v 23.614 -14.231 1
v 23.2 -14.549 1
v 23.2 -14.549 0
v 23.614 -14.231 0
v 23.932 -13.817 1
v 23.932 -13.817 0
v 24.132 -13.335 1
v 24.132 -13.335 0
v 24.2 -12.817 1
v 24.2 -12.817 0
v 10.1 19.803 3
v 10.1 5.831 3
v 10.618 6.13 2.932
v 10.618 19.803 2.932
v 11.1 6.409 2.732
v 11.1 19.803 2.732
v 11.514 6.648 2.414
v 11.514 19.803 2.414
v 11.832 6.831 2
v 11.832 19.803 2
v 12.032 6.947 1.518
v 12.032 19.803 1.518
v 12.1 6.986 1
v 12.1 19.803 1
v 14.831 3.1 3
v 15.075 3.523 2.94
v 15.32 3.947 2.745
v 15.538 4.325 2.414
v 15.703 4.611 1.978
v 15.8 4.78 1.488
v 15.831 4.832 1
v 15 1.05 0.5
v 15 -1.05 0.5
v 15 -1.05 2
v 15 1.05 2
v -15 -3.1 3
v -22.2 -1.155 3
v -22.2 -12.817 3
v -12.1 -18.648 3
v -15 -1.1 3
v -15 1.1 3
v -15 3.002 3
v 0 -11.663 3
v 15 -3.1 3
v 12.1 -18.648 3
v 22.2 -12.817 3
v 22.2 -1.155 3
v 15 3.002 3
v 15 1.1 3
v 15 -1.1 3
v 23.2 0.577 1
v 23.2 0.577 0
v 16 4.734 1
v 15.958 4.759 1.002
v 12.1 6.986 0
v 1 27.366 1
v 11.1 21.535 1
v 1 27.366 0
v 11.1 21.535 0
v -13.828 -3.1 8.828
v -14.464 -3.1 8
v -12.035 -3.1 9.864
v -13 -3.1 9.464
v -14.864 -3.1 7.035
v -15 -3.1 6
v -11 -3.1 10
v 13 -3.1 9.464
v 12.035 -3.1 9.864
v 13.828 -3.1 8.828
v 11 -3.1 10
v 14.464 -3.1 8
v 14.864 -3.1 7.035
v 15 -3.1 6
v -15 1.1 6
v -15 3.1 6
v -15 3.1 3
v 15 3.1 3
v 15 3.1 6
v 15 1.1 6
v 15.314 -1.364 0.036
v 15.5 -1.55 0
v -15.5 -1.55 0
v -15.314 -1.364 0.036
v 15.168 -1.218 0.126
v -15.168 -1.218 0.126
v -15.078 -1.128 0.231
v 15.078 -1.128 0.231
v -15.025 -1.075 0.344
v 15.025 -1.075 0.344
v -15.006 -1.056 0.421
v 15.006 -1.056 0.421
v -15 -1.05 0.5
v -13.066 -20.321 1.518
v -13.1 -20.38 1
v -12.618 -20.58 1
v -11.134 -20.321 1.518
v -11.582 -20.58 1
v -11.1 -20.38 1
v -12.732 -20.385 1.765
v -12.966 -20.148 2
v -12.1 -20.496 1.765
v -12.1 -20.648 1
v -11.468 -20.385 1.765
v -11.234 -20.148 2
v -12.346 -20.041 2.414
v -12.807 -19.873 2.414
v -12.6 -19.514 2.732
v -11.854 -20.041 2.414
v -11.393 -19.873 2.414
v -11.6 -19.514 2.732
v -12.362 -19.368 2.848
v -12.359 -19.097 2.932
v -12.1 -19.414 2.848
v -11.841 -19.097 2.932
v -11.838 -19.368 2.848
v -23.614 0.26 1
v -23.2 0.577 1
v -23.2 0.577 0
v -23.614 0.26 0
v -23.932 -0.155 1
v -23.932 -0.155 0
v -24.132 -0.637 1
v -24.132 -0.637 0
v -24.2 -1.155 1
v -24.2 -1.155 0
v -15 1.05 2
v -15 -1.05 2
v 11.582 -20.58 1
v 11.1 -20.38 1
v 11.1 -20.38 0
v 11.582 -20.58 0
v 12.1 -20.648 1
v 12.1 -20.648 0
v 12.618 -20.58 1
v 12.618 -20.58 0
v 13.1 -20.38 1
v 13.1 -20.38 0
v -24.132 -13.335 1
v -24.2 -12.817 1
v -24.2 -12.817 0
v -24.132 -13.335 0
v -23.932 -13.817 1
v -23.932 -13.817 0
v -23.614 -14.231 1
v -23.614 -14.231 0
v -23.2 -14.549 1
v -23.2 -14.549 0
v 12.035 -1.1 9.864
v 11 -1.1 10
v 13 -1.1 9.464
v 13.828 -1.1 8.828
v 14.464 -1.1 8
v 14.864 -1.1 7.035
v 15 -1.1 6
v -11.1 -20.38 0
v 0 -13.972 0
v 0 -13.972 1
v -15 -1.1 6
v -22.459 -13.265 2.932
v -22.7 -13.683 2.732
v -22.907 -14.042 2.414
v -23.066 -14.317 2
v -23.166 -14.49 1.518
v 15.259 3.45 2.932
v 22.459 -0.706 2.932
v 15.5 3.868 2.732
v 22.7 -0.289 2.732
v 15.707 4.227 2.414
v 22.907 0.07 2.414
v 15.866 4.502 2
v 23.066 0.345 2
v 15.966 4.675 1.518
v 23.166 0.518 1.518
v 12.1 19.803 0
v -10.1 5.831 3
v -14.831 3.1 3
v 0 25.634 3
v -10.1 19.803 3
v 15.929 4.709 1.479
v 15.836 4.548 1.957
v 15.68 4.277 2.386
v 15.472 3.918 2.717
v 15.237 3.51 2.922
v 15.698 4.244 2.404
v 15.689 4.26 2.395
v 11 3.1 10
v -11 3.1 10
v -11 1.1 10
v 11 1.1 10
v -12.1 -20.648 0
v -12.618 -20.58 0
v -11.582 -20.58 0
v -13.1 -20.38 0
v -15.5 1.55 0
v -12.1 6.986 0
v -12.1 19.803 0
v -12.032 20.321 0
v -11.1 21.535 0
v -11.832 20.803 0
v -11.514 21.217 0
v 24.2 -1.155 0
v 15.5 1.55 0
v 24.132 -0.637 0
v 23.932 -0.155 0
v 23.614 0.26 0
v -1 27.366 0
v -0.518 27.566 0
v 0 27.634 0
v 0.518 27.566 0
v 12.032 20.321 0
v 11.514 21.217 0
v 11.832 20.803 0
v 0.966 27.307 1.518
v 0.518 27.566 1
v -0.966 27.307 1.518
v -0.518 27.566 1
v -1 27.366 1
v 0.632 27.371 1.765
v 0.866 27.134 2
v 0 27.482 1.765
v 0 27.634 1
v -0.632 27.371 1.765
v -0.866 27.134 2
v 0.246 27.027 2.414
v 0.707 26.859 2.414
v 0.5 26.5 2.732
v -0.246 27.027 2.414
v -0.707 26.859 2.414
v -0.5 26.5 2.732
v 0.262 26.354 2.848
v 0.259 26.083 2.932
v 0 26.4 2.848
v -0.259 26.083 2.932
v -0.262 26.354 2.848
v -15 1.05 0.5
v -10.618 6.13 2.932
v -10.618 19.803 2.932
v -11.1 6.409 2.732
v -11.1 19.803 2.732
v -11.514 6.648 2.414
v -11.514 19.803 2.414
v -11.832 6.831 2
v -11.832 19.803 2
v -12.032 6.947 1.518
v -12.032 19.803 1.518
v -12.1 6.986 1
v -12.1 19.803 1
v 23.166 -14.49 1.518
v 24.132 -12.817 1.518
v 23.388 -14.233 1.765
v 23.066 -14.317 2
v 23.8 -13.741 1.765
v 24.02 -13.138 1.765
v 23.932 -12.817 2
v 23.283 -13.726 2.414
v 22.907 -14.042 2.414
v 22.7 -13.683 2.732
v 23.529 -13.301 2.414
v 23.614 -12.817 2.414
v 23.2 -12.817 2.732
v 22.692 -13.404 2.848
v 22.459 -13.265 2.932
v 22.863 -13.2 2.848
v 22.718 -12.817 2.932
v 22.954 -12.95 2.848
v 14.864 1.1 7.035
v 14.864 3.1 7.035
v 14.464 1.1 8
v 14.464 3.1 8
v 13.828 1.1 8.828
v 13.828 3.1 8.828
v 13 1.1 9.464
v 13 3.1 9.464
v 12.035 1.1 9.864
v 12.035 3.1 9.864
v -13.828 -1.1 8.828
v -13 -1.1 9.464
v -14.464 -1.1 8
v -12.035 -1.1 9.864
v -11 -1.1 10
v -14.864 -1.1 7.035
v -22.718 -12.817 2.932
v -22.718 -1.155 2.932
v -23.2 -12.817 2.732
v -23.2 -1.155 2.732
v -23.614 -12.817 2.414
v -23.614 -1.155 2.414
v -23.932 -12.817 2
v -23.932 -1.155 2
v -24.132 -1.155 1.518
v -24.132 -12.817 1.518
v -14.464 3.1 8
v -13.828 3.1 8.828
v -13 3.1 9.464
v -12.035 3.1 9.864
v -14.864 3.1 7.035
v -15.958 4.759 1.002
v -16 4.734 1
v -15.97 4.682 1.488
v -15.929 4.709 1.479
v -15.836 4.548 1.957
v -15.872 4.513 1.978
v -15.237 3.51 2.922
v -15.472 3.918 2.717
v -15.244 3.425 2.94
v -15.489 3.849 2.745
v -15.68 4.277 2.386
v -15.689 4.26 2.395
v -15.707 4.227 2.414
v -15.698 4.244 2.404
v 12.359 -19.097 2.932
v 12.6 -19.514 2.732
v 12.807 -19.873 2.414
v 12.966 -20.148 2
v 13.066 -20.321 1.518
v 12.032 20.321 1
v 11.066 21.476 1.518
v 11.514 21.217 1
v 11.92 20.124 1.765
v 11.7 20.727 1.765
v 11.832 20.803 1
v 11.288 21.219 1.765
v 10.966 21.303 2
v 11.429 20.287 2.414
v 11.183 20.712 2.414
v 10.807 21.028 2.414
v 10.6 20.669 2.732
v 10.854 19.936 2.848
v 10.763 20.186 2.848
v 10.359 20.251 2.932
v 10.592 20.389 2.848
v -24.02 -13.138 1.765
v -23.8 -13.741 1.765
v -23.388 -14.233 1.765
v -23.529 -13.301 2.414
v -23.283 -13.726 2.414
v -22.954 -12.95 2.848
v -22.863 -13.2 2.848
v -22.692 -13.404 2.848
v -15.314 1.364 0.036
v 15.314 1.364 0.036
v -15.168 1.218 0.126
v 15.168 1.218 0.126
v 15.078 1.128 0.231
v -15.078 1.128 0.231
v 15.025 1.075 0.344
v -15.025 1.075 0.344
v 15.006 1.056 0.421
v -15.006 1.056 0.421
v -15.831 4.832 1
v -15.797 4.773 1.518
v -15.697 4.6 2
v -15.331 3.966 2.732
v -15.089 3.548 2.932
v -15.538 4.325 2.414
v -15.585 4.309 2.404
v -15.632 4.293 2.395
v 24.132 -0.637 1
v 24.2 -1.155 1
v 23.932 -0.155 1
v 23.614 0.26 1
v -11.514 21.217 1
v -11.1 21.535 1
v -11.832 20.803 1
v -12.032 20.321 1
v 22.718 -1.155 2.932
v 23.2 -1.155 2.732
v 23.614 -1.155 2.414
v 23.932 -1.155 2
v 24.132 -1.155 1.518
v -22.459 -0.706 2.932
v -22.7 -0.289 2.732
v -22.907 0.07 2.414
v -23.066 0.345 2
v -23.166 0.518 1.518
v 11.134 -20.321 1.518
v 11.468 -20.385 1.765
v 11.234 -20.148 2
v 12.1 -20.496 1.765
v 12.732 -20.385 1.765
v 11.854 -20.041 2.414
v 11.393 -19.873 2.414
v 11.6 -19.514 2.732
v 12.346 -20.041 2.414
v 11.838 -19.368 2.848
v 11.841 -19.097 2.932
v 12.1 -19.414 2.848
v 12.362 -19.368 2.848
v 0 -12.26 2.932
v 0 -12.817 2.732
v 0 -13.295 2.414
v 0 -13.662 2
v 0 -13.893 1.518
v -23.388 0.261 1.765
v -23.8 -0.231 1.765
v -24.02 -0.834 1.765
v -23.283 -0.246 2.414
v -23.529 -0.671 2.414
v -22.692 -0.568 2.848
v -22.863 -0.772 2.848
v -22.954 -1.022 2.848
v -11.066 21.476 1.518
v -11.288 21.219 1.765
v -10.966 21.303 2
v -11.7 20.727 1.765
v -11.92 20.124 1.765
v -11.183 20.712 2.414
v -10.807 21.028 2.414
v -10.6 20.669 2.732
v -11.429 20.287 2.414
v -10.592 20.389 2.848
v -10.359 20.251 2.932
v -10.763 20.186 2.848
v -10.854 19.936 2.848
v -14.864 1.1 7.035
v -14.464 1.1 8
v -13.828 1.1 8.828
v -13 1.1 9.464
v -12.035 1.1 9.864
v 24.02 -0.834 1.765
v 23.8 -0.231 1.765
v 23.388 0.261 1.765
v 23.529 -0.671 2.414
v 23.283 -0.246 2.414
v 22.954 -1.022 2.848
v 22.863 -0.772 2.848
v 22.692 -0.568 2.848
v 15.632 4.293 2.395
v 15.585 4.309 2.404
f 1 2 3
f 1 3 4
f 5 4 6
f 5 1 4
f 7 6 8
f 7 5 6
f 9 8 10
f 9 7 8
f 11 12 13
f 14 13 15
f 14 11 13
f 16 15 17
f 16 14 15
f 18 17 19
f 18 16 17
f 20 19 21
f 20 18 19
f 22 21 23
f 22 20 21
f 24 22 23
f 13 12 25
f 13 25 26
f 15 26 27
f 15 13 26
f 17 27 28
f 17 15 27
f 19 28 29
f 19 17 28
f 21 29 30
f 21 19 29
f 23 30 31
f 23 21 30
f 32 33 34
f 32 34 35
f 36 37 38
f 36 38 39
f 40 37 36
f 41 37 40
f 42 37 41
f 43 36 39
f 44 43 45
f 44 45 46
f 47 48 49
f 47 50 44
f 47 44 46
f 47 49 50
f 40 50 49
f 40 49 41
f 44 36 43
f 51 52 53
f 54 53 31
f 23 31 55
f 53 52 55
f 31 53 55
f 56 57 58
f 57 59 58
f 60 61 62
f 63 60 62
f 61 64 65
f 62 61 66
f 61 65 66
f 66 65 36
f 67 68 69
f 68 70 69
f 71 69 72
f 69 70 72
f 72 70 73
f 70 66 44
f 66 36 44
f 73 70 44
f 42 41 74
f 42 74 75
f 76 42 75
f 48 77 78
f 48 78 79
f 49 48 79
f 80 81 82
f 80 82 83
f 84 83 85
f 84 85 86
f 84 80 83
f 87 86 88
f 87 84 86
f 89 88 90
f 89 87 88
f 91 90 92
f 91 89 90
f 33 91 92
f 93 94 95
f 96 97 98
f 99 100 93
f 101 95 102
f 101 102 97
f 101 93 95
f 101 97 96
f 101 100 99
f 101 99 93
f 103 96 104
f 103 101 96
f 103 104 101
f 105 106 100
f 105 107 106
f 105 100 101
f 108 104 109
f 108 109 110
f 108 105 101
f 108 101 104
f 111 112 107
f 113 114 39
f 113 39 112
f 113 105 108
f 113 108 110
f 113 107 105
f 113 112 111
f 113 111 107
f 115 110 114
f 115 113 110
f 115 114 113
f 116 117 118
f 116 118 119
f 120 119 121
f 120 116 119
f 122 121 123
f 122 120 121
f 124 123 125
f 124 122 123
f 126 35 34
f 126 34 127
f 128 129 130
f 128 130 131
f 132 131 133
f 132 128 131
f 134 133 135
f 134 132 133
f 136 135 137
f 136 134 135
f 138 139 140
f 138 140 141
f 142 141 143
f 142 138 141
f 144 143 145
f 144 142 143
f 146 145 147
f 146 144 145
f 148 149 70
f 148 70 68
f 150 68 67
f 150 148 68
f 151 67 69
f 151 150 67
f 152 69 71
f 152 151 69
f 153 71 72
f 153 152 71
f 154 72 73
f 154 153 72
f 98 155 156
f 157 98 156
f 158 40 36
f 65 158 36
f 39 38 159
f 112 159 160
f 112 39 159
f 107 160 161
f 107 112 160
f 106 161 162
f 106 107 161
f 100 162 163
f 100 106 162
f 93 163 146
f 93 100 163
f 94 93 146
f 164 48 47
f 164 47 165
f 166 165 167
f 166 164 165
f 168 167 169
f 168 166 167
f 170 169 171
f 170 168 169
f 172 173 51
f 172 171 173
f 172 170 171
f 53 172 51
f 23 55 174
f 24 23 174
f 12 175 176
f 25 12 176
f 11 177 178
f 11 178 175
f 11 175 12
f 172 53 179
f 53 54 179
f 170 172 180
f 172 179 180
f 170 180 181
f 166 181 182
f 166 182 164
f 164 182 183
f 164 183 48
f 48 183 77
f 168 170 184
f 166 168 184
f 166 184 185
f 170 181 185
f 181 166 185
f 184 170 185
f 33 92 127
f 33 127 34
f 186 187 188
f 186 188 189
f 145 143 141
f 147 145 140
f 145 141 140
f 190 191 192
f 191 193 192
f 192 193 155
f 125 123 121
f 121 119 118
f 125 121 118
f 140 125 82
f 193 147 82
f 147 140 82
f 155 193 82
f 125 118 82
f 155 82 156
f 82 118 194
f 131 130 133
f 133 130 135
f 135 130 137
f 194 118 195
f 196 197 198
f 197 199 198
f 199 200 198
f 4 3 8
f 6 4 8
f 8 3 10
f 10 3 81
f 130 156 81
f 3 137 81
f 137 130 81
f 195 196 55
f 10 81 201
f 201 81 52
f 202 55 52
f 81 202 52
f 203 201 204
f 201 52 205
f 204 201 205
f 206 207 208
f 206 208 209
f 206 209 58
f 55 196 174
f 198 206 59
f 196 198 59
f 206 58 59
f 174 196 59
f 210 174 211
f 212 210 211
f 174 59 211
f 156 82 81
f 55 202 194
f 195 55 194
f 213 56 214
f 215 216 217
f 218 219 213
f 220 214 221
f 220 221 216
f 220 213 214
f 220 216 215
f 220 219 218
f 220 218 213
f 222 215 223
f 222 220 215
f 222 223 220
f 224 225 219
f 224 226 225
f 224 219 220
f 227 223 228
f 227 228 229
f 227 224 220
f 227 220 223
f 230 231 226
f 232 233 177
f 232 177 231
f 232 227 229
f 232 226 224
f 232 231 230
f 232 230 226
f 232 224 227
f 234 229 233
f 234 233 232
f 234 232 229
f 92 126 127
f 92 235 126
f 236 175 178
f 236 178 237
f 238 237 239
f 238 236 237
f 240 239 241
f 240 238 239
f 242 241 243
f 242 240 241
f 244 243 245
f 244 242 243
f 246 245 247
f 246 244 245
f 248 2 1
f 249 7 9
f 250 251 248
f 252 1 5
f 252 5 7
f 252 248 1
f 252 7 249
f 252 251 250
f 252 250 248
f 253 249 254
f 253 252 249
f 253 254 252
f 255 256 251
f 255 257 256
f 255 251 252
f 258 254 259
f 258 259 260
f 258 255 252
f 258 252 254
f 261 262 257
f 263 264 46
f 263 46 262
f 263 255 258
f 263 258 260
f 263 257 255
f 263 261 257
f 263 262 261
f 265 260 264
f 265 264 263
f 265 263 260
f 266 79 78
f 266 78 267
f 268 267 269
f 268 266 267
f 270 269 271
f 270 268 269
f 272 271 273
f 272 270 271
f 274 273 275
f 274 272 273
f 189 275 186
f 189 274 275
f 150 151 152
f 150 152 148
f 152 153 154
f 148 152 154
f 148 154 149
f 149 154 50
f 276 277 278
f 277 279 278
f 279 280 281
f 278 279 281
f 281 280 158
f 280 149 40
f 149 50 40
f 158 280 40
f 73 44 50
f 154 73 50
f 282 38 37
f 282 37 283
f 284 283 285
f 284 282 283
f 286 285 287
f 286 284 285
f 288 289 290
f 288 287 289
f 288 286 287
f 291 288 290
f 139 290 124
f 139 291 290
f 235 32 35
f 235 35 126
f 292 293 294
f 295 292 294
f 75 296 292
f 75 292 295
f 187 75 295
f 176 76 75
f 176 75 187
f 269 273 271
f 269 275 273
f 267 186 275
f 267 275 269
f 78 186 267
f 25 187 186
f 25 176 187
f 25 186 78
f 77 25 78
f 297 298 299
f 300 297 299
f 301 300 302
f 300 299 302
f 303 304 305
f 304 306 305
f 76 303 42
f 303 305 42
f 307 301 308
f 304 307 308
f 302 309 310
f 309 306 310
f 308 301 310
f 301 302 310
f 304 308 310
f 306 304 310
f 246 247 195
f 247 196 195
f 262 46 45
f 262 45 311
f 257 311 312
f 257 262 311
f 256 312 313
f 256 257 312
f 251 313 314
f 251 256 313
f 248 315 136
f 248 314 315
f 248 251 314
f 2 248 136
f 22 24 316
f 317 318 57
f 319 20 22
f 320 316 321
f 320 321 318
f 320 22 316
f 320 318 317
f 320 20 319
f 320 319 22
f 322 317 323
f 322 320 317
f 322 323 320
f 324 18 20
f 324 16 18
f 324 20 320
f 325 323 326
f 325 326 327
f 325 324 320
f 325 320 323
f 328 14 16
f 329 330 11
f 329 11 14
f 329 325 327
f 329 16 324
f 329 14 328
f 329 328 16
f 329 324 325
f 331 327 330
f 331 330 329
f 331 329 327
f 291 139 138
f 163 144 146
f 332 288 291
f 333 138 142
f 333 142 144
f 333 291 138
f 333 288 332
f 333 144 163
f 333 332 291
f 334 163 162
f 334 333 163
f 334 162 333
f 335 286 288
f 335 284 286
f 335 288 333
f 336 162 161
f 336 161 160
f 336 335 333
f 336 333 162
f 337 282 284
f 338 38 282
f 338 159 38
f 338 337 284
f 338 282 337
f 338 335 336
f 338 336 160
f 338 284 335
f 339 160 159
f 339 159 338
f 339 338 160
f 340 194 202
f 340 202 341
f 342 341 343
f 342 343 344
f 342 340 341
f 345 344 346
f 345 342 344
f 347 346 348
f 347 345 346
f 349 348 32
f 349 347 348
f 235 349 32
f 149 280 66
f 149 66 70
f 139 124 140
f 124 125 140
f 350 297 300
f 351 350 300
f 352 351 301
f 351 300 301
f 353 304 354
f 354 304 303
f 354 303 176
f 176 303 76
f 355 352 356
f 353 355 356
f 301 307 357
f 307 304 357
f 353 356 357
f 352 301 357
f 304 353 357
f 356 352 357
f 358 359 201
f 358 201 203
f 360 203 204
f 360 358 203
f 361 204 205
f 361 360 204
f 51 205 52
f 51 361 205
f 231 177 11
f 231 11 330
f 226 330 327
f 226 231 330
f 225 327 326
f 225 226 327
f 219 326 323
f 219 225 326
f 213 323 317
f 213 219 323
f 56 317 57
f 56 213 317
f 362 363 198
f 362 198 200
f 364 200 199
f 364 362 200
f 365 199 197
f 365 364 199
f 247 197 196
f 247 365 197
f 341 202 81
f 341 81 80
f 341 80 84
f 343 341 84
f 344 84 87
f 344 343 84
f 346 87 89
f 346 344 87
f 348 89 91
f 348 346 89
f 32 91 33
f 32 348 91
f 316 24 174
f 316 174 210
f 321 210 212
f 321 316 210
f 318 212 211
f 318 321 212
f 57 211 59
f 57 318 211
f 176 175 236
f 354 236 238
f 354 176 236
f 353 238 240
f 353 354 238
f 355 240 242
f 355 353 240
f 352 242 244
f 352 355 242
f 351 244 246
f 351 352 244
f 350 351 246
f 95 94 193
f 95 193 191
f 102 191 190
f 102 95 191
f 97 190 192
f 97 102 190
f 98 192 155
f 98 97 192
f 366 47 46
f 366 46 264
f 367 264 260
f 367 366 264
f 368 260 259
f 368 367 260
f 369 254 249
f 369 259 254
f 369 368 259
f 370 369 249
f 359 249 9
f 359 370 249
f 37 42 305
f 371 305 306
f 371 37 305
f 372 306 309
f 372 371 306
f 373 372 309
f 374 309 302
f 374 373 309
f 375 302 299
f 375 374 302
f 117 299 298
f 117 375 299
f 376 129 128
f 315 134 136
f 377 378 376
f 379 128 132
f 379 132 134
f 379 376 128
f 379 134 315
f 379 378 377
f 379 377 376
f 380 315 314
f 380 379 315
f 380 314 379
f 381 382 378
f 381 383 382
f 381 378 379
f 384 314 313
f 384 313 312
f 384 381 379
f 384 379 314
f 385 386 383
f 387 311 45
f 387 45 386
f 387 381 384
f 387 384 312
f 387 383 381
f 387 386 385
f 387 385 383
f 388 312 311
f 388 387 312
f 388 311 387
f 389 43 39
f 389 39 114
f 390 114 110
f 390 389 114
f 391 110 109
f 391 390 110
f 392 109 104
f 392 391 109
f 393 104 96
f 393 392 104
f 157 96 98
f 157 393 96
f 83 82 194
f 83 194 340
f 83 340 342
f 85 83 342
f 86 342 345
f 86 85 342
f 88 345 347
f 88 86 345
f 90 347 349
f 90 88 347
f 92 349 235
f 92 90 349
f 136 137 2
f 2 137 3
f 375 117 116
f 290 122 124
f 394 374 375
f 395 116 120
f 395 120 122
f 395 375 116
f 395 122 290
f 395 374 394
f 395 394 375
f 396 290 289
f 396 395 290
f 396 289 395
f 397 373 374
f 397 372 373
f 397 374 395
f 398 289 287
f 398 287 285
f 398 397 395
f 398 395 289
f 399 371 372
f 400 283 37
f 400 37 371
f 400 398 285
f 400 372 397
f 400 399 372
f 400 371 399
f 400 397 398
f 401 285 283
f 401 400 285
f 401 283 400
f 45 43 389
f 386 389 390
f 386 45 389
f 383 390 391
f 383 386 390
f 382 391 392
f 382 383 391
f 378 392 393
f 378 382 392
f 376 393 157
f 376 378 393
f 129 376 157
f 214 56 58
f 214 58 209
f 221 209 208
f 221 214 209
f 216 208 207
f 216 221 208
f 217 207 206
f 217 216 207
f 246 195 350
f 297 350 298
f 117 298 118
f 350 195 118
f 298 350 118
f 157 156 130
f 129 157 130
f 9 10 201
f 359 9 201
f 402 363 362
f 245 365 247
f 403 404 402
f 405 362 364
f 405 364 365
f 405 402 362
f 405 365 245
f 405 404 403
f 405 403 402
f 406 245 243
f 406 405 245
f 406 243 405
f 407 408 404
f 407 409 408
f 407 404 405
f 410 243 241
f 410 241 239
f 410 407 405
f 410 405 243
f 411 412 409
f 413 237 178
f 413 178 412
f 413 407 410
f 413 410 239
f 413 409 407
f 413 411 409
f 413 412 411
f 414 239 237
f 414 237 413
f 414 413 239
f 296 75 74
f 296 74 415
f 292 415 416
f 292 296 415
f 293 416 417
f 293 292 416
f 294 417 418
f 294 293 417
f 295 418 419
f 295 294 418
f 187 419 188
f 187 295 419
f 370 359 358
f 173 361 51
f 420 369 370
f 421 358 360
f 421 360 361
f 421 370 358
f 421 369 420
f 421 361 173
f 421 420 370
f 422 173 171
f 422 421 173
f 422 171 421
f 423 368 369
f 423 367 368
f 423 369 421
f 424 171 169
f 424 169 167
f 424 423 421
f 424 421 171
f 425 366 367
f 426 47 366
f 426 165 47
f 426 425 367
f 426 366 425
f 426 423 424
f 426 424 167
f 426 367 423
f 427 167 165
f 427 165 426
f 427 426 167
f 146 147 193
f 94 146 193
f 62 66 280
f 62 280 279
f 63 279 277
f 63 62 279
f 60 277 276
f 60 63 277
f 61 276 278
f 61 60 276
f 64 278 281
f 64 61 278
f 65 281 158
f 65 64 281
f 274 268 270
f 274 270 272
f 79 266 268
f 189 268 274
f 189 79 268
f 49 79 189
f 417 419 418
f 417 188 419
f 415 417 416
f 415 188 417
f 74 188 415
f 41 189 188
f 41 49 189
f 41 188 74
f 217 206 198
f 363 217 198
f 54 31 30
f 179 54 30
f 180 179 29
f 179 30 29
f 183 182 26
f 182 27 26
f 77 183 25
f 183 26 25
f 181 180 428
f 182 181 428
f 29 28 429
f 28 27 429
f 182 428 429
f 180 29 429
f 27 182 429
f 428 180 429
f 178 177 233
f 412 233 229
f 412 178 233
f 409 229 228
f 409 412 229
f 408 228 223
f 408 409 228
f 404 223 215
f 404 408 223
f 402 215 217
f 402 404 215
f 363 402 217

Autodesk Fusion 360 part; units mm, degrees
sketch "Sketch1" plane through (0, 0, 0) normal (0, 0, 1) x (1, 0, 0)
  line L0 (0, 0) -> (-12.1, 6.9859) construction
  line L1 (0, 0) -> (0, -13.9719) construction
  line L2 (0, 0) -> (12.1, 6.9859) construction
  line L3 (12.1, -20.9578) -> (24.2, -13.9719)
  line L4 (24.2, -13.9719) -> (24.2, 0)
  line L5 (24.2, 0) -> (12.1, 6.9859)
  line L6 (12.1, 6.9859) -> (0, 0)
  line L7 (0, 0) -> (0, -13.9719)
  line L8 (0, -13.9719) -> (12.1, -20.9578)
  line L9 (12.1, 6.9859) -> (12.1, 20.9578)
  line L10 (12.1, 20.9578) -> (0, 27.9438)
  line L11 (0, 27.9438) -> (-12.1, 20.9578)
  line L12 (-12.1, 20.9578) -> (-12.1, 6.9859)
  line L13 (-12.1, 6.9859) -> (0, 0)
  line L14 (0, 0) -> (12.1, 6.9859) construction
  line L15 (0, -13.9719) -> (0, 0) construction
  line L16 (0, 0) -> (-12.1, 6.9859)
  line L17 (-12.1, 6.9859) -> (-24.2, 0)
  line L18 (-24.2, 0) -> (-24.2, -13.9719)
  line L19 (-24.2, -13.9719) -> (-12.1, -20.9578)
  line L20 (-12.1, -20.9578) -> (0, -13.9719)
  point P0 (12.1, -6.9859)
  point P1 (0, 13.9719)
  point P2 (-12.1, -6.9859)
  dimension "d3" = 120
  dimension "d4" = 120
  dimension "d5" = 12.1
  dimension "d6" = 12.1
  dimension "d7" = 12.1
extrude "Extrude1" add sketch "Sketch1" along normal blind 3
sketch "Sketch2" plane through (0, 0, 3) normal (0, 0, 1) x (1, 0, 0)
  line L0 (-12.1, -20.9578) -> (0, -13.9719)
  line L1 (0, -13.9719) -> (12.1, -20.9578)
  line L2 (12.1, -20.9578) -> (24.2, -13.9719)
  line L3 (24.2, -13.9719) -> (24.2, 0)
  line L4 (24.2, 0) -> (12.1, 6.9859)
  line L5 (12.1, 6.9859) -> (12.1, 20.9578)
  line L6 (12.1, 20.9578) -> (0, 27.9438)
  line L7 (0, 27.9438) -> (-12.1, 20.9578)
  line L8 (-12.1, 20.9578) -> (-12.1, 6.9859)
  line L9 (-12.1, 6.9859) -> (-24.2, 0)
  line L10 (-24.2, 0) -> (-24.2, -13.9719)
  line L11 (-24.2, -13.9719) -> (-12.1, -20.9578)
  line L12 (15, 1.1) -> (-15, 1.1)
  line L13 (-15, 1.1) -> (-15, 3.1)
  line L14 (-15, 3.1) -> (15, 3.1)
  line L15 (15, 3.1) -> (15, 1.1)
  line L16 (15, -1.1) -> (-15, -1.1)
  line L17 (-15, -1.1) -> (-15, -3.1)
  line L18 (-15, -3.1) -> (15, -3.1)
  line L19 (15, -3.1) -> (15, -1.1)
  line L20 (24.2, -13.9719) -> (-12.1, 6.9859) construction
  line L21 (-24.2, -13.9719) -> (12.1, 6.9859) construction
  line L22 (0, 27.9438) -> (0, -13.9719) construction
  line L23 (24.2, -13.9719) -> (24.2, 0)
  line L24 (24.2, 0) -> (-24.2, 0) construction
  dimension "d10" = 30
  dimension "d11" = 2
  dimension "d16" = 2.2
extrude "Extrude2" add sketch "Sketch2" along normal blind 7 contours L12 L13 L14 L15 | L16 L17 L18 L19
sketch "Sketch3" plane through (0, 0, 0) normal (0, 0, -1) x (-1, 0, 0)
  line L0 (0, -13.9719) -> (12.1, -20.9578)
  line L1 (12.1, -20.9578) -> (24.2, -13.9719)
  line L2 (24.2, -13.9719) -> (24.2, 0)
  line L3 (24.2, 0) -> (12.1, 6.9859)
  line L4 (12.1, 6.9859) -> (12.1, 20.9578)
  line L5 (12.1, 20.9578) -> (0, 27.9438)
  line L6 (0, 27.9438) -> (-12.1, 20.9578)
  line L7 (-12.1, 20.9578) -> (-12.1, 6.9859)
  line L8 (-12.1, 6.9859) -> (-24.2, 0)
  line L9 (-24.2, 0) -> (-24.2, -13.9719)
  line L10 (-24.2, -13.9719) -> (-12.1, -20.9578)
  line L11 (-12.1, -20.9578) -> (0, -13.9719)
  line L12 (-15, 1.05) -> (15, 1.05)
  line L13 (15, 1.05) -> (15, -1.05)
  line L14 (15, -1.05) -> (-15, -1.05)
  line L15 (-15, -1.05) -> (-15, 1.05)
  line L16 (-15, 0) -> (15, 0) construction
  line L17 (0, -1.05) -> (0, 1.05) construction
  dimension "d19" = 30
  dimension "d20" = 2.1
extrude "Extrude3" cut sketch "Sketch3" against normal blind 2 contours L12 L13 L14 L15
fillet "Fillet1" radius 4 4 edges at (15, 2.1, 10) (15, -2.1, 10) (-15, 2.1, 10) (-15, -2.1, 10)
fillet "Fillet2" radius 2 9 edges at (-12.1, -20.9578, 1.5) (12.1, -20.9578, 1.5) (24.2, -13.9719, 1.5) (24.2, 0, 1.5) (12.1, 20.9578, 1.5) (0, 27.9438, 1.5) (-12.1, 20.9578, 1.5) (-24.2, 0, 1.5) (-24.2, -13.9719, 1.5)
fillet "Fillet3" radius 0.5 4 edges at (0, -1.05, 0) (0, 1.05, 0) (-15, 0, 0) (15, 0, 0)
fillet "Fillet5" radius 2 21 edges at (12.1, 13.3945, 3) (11.8321, 20.8031, 3) (6.05, 24.4508, 3) (0, 27.6344, 3) (-6.05, 24.4508, 3) (-11.8321, 20.8031, 3) (-12.1, 13.3945, 3) (5.55, -17.1762, 3) (12.1, -20.6484, 3) (18.15, -17.4648, 3) (23.9321, -13.8172, 3) (24.2, -6.9859, 3) (23.9321, -0.1547, 3) (17.65, 3.7816, 3) (-17.65, 3.7816, 3) (-23.9321, -0.1547, 3) (-24.2, -6.9859, 3) (-23.9321, -13.8172, 3) (-18.15, -17.4648, 3) (-12.1, -20.6484, 3) (-5.55, -17.1762, 3)
